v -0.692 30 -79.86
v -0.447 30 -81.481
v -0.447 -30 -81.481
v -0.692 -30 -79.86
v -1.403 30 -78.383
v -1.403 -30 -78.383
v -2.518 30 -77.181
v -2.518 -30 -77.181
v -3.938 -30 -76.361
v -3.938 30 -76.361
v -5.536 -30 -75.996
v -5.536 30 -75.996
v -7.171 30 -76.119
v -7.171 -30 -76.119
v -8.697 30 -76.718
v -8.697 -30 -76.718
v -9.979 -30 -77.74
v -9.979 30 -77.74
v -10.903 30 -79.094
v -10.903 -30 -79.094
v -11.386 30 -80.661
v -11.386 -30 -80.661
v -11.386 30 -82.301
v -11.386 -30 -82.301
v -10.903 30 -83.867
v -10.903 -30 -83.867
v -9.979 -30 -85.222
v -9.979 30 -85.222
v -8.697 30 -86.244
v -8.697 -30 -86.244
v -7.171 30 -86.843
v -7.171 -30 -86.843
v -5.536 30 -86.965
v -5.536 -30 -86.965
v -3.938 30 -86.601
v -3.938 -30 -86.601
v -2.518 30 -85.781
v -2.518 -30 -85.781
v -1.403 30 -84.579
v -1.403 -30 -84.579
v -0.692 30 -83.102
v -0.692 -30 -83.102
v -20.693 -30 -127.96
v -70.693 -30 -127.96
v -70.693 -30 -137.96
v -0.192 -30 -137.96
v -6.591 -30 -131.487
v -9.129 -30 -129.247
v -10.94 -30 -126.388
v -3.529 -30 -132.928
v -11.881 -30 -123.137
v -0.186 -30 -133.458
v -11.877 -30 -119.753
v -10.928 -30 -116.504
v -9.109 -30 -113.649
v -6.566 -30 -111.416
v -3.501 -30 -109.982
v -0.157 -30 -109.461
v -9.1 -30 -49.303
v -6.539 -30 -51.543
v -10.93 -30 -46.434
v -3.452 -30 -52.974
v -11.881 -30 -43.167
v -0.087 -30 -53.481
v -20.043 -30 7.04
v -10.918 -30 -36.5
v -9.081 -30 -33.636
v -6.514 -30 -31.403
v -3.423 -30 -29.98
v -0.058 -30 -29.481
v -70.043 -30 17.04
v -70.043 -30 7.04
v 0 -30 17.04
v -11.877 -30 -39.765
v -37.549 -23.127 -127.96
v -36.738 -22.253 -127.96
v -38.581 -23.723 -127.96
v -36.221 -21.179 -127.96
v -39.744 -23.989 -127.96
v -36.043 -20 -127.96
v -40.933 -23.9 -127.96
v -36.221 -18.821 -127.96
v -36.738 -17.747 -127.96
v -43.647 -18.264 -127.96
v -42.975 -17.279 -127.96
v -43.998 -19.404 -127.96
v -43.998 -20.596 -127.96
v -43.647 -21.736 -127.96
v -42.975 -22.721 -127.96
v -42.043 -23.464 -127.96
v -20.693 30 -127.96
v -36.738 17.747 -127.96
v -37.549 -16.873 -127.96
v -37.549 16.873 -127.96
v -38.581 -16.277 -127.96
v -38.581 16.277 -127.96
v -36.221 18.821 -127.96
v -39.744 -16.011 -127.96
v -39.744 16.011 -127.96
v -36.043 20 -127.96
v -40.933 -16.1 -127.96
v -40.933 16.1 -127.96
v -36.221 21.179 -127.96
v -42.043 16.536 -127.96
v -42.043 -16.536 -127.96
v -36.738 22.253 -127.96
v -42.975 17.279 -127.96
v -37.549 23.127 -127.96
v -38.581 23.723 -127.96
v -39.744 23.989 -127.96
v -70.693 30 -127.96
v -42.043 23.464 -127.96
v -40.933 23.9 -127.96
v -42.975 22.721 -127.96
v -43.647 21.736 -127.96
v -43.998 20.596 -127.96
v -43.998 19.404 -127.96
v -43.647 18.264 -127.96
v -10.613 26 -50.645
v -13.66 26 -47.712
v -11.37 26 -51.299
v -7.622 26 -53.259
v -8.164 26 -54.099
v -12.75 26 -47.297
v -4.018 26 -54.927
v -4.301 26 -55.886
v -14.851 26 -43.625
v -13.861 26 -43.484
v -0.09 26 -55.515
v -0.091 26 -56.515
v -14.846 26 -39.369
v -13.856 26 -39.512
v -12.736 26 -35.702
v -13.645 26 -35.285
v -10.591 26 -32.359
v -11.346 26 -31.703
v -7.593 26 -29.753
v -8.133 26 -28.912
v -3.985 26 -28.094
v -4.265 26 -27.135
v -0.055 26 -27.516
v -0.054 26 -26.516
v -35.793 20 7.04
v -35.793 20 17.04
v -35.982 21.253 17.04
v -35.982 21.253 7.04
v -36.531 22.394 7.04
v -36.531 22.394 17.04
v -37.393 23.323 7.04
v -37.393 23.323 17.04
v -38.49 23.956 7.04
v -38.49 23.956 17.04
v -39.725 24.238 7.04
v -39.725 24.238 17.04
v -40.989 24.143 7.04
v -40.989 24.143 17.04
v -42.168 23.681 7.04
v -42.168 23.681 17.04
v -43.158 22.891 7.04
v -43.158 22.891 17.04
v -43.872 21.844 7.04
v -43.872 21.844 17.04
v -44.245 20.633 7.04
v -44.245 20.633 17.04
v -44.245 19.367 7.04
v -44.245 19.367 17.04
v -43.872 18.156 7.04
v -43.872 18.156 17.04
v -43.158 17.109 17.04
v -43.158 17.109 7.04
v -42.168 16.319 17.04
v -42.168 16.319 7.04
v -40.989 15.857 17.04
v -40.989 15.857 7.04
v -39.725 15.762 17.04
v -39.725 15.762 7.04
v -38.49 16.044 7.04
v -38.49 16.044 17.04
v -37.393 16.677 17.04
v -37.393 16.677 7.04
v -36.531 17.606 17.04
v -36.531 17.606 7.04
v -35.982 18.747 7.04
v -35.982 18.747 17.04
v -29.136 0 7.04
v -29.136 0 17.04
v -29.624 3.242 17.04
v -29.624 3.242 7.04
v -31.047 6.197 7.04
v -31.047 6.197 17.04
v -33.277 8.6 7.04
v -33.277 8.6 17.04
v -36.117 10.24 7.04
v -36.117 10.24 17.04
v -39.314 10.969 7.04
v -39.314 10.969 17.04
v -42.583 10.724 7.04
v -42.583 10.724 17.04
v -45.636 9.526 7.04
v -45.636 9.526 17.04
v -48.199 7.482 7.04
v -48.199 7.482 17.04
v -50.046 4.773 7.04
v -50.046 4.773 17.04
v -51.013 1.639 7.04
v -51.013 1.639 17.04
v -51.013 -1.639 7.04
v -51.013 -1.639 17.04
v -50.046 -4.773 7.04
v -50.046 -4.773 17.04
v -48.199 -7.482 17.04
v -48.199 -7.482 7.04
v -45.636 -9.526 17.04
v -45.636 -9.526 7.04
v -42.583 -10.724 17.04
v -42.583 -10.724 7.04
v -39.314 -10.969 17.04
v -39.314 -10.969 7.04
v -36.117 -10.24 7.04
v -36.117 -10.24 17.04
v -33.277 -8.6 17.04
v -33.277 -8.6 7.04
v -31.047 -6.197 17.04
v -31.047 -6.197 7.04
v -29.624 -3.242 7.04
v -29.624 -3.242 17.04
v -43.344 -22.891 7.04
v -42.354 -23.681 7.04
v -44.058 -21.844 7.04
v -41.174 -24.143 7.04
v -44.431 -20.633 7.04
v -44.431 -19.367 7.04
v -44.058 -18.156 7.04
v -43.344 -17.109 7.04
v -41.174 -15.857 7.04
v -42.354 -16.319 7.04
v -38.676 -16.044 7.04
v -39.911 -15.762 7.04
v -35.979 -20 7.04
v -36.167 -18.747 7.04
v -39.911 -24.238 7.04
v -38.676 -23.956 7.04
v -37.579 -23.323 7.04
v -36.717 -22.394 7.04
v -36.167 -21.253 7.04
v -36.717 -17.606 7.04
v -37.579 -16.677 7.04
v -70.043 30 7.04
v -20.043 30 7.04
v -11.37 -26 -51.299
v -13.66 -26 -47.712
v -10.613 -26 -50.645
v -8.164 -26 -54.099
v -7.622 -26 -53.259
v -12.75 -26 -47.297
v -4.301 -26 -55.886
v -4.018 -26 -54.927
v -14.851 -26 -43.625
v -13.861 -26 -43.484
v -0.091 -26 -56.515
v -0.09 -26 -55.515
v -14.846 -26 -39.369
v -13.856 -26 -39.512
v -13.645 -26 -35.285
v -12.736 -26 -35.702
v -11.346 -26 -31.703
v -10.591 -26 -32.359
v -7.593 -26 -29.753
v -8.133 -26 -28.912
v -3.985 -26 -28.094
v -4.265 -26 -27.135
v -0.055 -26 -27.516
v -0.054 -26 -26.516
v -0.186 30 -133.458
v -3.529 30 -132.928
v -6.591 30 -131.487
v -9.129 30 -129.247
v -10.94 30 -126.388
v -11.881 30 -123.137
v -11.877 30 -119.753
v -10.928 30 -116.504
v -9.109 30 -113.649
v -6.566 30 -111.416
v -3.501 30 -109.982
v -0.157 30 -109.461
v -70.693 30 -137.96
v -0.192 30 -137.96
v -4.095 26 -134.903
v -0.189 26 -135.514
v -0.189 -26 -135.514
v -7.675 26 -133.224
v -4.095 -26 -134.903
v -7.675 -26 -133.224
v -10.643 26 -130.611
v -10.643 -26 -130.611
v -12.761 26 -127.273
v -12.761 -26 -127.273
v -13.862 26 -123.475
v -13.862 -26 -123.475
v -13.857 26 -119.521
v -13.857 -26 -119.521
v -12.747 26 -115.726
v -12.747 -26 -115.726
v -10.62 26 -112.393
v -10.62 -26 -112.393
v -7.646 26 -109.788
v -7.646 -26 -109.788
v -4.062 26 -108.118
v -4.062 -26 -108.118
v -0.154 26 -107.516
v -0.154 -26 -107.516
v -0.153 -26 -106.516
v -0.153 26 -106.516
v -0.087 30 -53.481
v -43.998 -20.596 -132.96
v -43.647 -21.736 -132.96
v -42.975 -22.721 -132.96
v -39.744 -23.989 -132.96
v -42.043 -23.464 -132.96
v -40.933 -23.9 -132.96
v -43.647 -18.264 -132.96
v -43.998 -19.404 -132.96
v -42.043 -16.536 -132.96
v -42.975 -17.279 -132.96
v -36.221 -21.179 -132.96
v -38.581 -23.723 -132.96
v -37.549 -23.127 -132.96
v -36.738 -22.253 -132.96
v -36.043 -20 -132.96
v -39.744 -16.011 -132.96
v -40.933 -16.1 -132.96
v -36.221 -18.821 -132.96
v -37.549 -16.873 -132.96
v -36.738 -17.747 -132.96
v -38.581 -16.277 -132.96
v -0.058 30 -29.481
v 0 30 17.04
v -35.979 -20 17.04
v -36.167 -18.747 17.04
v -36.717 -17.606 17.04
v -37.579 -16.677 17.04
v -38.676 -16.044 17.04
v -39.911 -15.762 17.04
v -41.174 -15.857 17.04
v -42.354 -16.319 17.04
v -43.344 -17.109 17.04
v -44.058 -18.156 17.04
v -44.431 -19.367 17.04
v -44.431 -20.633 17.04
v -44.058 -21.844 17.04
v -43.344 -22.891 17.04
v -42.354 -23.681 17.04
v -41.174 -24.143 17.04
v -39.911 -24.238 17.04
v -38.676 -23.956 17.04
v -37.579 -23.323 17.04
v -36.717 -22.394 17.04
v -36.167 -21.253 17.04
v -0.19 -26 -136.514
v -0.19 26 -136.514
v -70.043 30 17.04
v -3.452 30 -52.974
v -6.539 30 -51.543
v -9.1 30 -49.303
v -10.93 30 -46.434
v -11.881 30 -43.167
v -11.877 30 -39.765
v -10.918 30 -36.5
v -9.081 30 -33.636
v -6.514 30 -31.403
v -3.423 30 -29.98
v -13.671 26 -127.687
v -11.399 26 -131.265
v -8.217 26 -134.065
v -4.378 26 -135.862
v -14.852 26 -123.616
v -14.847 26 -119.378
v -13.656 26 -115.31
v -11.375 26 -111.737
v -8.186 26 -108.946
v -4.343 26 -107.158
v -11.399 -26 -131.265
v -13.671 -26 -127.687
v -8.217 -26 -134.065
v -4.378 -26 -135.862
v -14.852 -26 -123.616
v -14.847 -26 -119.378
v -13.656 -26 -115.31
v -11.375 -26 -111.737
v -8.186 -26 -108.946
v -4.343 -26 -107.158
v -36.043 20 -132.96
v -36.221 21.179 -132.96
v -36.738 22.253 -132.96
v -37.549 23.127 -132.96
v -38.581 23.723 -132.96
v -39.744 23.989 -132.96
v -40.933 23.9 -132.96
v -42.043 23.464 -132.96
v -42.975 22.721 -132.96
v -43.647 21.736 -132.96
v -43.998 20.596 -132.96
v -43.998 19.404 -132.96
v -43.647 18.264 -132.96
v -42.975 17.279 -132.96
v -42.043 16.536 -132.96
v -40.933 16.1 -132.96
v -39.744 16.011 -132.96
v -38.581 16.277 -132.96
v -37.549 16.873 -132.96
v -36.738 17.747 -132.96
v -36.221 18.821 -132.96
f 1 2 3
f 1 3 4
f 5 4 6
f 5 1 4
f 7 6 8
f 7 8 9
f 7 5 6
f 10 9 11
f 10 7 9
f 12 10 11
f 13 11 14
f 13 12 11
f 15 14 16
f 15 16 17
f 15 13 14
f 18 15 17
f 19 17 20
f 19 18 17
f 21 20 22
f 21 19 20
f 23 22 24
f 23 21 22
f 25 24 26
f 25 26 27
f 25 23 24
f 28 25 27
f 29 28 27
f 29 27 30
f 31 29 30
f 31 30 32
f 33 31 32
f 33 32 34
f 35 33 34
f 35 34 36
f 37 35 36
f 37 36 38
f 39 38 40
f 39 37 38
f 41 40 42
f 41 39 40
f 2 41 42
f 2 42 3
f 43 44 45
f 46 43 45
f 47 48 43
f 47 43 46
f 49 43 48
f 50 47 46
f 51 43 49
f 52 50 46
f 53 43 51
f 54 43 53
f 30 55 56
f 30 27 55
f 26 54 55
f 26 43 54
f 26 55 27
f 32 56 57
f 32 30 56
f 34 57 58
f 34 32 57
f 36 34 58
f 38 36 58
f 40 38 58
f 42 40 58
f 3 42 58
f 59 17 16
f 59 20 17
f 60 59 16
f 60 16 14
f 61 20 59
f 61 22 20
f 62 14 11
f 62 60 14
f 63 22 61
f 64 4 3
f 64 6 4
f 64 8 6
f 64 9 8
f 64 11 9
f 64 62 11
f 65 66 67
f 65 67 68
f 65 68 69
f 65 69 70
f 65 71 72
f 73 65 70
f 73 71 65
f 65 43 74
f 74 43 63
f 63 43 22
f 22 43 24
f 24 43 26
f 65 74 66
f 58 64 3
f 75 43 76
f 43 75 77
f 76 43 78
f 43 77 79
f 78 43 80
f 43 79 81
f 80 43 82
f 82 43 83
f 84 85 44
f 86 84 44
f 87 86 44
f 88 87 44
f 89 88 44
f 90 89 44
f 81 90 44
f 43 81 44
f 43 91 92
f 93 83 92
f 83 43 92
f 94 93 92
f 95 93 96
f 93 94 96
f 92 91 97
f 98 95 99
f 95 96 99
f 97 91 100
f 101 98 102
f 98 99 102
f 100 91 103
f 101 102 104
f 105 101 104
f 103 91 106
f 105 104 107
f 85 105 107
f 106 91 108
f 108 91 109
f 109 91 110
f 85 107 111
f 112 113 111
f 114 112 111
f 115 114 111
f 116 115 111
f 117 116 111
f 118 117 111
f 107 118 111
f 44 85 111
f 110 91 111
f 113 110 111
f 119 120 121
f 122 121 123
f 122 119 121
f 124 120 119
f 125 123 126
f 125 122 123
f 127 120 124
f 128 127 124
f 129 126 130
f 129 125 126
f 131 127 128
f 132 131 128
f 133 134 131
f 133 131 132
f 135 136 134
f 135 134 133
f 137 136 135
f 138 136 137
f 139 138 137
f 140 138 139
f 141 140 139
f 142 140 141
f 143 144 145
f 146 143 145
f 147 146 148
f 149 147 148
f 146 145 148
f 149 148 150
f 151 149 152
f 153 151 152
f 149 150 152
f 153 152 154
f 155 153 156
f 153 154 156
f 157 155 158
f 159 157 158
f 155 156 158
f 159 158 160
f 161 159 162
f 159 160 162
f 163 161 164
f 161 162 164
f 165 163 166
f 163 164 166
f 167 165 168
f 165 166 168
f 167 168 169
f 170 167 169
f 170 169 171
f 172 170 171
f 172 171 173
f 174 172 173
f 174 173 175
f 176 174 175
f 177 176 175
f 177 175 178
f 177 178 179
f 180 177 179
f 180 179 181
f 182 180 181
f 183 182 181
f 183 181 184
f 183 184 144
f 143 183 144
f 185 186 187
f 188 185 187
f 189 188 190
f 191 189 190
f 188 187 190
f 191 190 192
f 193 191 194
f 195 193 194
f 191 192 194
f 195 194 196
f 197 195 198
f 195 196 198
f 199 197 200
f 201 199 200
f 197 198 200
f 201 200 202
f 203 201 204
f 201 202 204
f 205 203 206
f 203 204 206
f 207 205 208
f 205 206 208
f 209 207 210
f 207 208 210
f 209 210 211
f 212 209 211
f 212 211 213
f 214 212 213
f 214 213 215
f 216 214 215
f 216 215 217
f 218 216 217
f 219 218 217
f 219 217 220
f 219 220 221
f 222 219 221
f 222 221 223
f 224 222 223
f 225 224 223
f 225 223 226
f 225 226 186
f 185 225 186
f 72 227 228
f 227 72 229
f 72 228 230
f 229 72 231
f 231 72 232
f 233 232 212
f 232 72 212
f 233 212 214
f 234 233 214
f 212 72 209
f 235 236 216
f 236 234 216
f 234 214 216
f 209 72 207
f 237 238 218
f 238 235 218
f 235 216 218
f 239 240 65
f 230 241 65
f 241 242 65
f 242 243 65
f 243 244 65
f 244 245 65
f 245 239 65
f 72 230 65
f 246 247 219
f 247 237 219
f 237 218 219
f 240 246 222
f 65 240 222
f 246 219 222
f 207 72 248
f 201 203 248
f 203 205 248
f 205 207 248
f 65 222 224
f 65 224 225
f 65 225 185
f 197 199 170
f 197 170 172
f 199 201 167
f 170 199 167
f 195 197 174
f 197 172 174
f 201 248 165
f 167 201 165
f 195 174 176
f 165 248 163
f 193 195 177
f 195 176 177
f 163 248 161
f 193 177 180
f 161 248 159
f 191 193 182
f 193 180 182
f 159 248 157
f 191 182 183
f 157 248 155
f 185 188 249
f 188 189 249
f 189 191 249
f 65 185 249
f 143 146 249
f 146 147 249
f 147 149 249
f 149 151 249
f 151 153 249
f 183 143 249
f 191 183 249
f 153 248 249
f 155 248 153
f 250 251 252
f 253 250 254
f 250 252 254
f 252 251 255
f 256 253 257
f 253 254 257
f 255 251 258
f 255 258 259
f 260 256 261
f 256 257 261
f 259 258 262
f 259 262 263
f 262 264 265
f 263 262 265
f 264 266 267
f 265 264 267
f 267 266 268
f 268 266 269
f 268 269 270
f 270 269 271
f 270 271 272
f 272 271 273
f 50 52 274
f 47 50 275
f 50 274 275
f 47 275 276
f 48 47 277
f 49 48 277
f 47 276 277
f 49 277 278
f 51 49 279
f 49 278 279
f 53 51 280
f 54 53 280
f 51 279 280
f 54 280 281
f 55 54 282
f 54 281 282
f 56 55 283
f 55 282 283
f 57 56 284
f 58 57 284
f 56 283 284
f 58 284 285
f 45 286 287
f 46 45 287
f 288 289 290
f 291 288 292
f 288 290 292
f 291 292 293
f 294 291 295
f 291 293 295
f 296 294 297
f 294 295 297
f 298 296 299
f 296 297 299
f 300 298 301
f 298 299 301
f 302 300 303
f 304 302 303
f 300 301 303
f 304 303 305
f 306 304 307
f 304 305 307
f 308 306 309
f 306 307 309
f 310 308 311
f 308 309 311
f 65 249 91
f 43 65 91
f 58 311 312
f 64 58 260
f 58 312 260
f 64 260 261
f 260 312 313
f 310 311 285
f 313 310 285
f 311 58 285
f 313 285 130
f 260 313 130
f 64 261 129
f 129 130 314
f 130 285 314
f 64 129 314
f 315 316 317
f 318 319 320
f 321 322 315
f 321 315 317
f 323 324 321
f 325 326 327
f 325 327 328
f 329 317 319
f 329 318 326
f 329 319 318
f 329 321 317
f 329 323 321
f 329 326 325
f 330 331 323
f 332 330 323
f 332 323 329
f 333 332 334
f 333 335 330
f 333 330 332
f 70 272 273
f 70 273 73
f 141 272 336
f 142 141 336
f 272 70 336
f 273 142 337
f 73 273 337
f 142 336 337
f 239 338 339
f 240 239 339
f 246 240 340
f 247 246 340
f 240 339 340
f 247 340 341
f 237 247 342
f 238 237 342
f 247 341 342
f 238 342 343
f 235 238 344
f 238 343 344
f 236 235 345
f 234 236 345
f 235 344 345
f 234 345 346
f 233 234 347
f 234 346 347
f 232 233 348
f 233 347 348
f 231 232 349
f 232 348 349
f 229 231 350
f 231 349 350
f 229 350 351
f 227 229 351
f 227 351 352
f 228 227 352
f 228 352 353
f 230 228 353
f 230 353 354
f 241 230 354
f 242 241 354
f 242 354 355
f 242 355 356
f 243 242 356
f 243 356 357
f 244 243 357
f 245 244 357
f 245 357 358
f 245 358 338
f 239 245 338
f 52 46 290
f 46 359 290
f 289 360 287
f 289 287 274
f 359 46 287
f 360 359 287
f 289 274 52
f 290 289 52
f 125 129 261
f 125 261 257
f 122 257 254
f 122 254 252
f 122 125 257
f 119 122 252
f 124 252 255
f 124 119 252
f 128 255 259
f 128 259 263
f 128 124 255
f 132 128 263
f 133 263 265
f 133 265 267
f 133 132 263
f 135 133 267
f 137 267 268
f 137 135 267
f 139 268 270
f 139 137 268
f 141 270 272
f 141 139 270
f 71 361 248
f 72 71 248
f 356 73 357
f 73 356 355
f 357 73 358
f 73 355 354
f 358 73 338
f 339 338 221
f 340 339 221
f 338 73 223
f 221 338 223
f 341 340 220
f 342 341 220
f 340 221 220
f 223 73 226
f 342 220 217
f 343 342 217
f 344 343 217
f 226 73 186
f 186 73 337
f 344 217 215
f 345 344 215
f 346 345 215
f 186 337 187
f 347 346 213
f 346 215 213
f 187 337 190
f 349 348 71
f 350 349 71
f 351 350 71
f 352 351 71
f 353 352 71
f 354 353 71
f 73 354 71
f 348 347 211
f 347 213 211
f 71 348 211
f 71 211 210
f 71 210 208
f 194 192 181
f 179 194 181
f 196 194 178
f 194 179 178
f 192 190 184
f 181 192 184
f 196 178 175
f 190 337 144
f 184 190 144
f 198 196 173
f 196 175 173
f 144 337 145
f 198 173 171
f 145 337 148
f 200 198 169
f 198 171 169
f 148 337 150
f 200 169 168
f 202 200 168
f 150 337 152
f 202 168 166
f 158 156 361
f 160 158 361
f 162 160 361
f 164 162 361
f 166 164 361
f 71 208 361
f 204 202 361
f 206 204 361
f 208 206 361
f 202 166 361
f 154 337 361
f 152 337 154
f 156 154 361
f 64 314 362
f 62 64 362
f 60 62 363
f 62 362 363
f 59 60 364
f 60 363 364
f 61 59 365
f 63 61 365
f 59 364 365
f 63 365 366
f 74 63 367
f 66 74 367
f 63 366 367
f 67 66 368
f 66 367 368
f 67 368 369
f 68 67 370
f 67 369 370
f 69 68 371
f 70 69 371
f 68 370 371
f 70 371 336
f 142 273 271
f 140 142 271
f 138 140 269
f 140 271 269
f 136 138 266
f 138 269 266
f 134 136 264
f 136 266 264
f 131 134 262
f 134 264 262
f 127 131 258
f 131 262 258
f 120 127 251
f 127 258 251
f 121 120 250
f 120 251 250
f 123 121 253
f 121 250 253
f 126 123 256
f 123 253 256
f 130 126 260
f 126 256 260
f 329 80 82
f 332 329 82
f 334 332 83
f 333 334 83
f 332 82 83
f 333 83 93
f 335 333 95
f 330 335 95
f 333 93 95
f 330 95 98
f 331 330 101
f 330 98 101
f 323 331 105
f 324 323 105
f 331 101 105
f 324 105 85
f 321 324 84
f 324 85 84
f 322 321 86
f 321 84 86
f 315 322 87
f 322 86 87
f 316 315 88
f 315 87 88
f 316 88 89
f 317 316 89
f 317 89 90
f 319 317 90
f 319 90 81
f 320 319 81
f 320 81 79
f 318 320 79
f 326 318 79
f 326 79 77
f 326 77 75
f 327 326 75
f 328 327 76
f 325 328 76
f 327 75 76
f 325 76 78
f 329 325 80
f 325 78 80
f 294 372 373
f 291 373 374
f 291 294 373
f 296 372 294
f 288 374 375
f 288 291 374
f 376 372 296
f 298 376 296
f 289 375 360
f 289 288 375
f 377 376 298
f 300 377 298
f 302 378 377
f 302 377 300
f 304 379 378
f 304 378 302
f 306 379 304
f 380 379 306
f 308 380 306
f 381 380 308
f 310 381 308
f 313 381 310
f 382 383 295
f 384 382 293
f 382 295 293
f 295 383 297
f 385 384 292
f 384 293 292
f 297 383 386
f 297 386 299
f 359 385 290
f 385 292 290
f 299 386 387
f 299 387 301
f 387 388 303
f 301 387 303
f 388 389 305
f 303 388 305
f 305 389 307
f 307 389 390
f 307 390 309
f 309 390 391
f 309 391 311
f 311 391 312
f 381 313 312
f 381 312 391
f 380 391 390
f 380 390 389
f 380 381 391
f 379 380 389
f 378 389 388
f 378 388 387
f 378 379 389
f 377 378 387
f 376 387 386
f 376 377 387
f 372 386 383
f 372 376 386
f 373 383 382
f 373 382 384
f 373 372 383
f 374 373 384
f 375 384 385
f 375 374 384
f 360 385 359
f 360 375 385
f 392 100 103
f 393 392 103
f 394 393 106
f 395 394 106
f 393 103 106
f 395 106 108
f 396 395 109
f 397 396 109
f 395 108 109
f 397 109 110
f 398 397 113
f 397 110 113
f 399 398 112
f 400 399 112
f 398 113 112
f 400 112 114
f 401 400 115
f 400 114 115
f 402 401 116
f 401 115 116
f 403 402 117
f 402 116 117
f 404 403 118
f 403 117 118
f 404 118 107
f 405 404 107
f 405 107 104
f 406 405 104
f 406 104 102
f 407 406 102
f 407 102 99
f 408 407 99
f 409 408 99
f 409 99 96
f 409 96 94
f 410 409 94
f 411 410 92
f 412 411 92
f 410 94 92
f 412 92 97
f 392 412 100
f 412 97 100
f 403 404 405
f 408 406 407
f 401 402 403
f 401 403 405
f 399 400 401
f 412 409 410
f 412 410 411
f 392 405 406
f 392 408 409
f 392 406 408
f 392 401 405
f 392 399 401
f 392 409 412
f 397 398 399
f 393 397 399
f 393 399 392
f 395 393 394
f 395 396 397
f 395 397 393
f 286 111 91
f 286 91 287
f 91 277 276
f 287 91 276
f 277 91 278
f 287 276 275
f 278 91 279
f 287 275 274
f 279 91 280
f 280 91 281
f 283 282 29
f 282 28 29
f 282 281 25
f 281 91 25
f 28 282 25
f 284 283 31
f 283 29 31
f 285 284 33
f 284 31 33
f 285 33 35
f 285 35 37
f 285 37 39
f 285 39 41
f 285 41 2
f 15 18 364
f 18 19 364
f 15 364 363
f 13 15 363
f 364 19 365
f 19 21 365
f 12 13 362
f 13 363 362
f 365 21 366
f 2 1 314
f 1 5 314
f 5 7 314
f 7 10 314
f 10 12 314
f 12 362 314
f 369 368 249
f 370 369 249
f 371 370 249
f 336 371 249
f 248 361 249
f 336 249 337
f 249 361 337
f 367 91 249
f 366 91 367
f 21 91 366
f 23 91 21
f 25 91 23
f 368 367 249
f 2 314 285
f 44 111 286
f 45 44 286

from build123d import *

# Parameters (mm, degrees)
F0_R           = 5.5
F1_DEPTH       = 60
F4_DEPTH       = 26
F4_DEPTH_BACK  = 26
F5_R           = 4
F6_DEPTH       = 5
F7_R           = 4.25
F8_DEPTH       = 15
F9_R           = 11
F10_DEPTH      = 25
F10_DEPTH_BACK = 25


# Not quite as in the source:
# - a feature names something its author has since deleted; it is built from what else it names


with BuildPart() as f1:
    # F0 (on Front) → F1 (new body)
    with BuildSketch(Plane.XZ):
        with BuildLine():
            ThreePointArc((-0.0872969156, -53.4805140133), (-11.9999962709, -41.4659778258), (-0.0575900904, -29.4809696761))
            Line((-0.0575900904, -29.4809696761), (-5.4639e-06, 17.0404876904))
            Line((-5.4639e-06, 17.0404876904), (-70.0428405992, 17.0404876904))
            Line((-70.0428405992, 17.0404876904), (-70.0428405992, 7.0404876904))
            Line((-70.0428405992, 7.0404876904), (-20.0428405992, 7.0404876904))
            Line((-20.0428405992, 7.0404876904), (-20.6929361639, -127.9595123096))
            Line((-20.6929361639, -127.9595123096), (-70.6929361639, -127.9595123096))
            Line((-70.6929361639, -127.9595123096), (-70.6929361639, -137.9595123096))
            Line((-70.6929361639, -137.9595123096), (-0.1918656855, -137.9595123096))
            Line((-0.1918656855, -137.9595123096), (-0.1862936956, -133.4580141387))
            ThreePointArc((-0.1862936956, -133.4580141387), (-11.9988136294, -121.4446249335), (-0.1565894029, -109.4605157571))
            Line((-0.1565894029, -109.4605157571), (-0.0872969156, -53.4805140133))
        make_face()
        with Locations((-5.947382655, -81.4808309078)):
            Circle(F0_R, mode=Mode.SUBTRACT)
    extrude(amount=F1_DEPTH)


with BuildPart() as f1_1:
    # F2: moved
    add(f1.part.moved(Location((0, 30, 0))))

    # F3 (on Front) → F4 (cut, two sides)
    with BuildSketch(Plane.XZ) as f4_sk:
        with BuildLine():
            ThreePointArc((0, -55.5154254436), (-14, -41.5154254436), (0, -27.5154254436))
            Line((0, -27.5154254436), (0, -26.5154254436))
            ThreePointArc((0, -26.5154254436), (-15, -41.5154254436), (0, -56.5154254436))
            Line((0, -56.5154254436), (0, -55.5154254436))
        make_face()
        with BuildLine():
            Line((0, -107.5154236555), (0, -106.5154236555))
            ThreePointArc((0, -106.5154236555), (-15, -121.5154236555), (0, -136.5154236555))
            Line((0, -136.5154236555), (0, -135.5154236555))
            ThreePointArc((0, -135.5154236555), (-14, -121.5154236555), (0, -107.5154236555))
        make_face()
    extrude(amount=F4_DEPTH, mode=Mode.SUBTRACT)
    extrude(f4_sk.sketch, amount=-F4_DEPTH_BACK, mode=Mode.SUBTRACT)

    # F5 (on face) → F6 (cut)
    with BuildSketch(Plane.XY.offset(-127.9595123096)):
        with Locations((-40.0428405992, -20)):
            Circle(F5_R)
        with Locations((-40.0428405992, 20)):
            Circle(F5_R)
    extrude(amount=-F6_DEPTH, mode=Mode.SUBTRACT)

    # F7 (on face) → F8 (cut)
    with BuildSketch(Plane.XY.offset(17.0404876904)):
        with Locations((-40.0428405992, 20)):
            Circle(F7_R)
        with Locations((-40.2286797762, -20)):
            Circle(F7_R)
    extrude(amount=-F8_DEPTH, mode=Mode.SUBTRACT)

    # F9 (on face) → F10 (cut, two sides)
    with BuildSketch(Plane.XY.offset(17.0404876904)) as f10_sk:
        with Locations((-40.1357601877, 0)):
            Circle(F9_R)
    extrude(amount=-F10_DEPTH, mode=Mode.SUBTRACT)
    extrude(f10_sk.sketch, amount=F10_DEPTH_BACK, mode=Mode.SUBTRACT)


solid = f1_1.part
